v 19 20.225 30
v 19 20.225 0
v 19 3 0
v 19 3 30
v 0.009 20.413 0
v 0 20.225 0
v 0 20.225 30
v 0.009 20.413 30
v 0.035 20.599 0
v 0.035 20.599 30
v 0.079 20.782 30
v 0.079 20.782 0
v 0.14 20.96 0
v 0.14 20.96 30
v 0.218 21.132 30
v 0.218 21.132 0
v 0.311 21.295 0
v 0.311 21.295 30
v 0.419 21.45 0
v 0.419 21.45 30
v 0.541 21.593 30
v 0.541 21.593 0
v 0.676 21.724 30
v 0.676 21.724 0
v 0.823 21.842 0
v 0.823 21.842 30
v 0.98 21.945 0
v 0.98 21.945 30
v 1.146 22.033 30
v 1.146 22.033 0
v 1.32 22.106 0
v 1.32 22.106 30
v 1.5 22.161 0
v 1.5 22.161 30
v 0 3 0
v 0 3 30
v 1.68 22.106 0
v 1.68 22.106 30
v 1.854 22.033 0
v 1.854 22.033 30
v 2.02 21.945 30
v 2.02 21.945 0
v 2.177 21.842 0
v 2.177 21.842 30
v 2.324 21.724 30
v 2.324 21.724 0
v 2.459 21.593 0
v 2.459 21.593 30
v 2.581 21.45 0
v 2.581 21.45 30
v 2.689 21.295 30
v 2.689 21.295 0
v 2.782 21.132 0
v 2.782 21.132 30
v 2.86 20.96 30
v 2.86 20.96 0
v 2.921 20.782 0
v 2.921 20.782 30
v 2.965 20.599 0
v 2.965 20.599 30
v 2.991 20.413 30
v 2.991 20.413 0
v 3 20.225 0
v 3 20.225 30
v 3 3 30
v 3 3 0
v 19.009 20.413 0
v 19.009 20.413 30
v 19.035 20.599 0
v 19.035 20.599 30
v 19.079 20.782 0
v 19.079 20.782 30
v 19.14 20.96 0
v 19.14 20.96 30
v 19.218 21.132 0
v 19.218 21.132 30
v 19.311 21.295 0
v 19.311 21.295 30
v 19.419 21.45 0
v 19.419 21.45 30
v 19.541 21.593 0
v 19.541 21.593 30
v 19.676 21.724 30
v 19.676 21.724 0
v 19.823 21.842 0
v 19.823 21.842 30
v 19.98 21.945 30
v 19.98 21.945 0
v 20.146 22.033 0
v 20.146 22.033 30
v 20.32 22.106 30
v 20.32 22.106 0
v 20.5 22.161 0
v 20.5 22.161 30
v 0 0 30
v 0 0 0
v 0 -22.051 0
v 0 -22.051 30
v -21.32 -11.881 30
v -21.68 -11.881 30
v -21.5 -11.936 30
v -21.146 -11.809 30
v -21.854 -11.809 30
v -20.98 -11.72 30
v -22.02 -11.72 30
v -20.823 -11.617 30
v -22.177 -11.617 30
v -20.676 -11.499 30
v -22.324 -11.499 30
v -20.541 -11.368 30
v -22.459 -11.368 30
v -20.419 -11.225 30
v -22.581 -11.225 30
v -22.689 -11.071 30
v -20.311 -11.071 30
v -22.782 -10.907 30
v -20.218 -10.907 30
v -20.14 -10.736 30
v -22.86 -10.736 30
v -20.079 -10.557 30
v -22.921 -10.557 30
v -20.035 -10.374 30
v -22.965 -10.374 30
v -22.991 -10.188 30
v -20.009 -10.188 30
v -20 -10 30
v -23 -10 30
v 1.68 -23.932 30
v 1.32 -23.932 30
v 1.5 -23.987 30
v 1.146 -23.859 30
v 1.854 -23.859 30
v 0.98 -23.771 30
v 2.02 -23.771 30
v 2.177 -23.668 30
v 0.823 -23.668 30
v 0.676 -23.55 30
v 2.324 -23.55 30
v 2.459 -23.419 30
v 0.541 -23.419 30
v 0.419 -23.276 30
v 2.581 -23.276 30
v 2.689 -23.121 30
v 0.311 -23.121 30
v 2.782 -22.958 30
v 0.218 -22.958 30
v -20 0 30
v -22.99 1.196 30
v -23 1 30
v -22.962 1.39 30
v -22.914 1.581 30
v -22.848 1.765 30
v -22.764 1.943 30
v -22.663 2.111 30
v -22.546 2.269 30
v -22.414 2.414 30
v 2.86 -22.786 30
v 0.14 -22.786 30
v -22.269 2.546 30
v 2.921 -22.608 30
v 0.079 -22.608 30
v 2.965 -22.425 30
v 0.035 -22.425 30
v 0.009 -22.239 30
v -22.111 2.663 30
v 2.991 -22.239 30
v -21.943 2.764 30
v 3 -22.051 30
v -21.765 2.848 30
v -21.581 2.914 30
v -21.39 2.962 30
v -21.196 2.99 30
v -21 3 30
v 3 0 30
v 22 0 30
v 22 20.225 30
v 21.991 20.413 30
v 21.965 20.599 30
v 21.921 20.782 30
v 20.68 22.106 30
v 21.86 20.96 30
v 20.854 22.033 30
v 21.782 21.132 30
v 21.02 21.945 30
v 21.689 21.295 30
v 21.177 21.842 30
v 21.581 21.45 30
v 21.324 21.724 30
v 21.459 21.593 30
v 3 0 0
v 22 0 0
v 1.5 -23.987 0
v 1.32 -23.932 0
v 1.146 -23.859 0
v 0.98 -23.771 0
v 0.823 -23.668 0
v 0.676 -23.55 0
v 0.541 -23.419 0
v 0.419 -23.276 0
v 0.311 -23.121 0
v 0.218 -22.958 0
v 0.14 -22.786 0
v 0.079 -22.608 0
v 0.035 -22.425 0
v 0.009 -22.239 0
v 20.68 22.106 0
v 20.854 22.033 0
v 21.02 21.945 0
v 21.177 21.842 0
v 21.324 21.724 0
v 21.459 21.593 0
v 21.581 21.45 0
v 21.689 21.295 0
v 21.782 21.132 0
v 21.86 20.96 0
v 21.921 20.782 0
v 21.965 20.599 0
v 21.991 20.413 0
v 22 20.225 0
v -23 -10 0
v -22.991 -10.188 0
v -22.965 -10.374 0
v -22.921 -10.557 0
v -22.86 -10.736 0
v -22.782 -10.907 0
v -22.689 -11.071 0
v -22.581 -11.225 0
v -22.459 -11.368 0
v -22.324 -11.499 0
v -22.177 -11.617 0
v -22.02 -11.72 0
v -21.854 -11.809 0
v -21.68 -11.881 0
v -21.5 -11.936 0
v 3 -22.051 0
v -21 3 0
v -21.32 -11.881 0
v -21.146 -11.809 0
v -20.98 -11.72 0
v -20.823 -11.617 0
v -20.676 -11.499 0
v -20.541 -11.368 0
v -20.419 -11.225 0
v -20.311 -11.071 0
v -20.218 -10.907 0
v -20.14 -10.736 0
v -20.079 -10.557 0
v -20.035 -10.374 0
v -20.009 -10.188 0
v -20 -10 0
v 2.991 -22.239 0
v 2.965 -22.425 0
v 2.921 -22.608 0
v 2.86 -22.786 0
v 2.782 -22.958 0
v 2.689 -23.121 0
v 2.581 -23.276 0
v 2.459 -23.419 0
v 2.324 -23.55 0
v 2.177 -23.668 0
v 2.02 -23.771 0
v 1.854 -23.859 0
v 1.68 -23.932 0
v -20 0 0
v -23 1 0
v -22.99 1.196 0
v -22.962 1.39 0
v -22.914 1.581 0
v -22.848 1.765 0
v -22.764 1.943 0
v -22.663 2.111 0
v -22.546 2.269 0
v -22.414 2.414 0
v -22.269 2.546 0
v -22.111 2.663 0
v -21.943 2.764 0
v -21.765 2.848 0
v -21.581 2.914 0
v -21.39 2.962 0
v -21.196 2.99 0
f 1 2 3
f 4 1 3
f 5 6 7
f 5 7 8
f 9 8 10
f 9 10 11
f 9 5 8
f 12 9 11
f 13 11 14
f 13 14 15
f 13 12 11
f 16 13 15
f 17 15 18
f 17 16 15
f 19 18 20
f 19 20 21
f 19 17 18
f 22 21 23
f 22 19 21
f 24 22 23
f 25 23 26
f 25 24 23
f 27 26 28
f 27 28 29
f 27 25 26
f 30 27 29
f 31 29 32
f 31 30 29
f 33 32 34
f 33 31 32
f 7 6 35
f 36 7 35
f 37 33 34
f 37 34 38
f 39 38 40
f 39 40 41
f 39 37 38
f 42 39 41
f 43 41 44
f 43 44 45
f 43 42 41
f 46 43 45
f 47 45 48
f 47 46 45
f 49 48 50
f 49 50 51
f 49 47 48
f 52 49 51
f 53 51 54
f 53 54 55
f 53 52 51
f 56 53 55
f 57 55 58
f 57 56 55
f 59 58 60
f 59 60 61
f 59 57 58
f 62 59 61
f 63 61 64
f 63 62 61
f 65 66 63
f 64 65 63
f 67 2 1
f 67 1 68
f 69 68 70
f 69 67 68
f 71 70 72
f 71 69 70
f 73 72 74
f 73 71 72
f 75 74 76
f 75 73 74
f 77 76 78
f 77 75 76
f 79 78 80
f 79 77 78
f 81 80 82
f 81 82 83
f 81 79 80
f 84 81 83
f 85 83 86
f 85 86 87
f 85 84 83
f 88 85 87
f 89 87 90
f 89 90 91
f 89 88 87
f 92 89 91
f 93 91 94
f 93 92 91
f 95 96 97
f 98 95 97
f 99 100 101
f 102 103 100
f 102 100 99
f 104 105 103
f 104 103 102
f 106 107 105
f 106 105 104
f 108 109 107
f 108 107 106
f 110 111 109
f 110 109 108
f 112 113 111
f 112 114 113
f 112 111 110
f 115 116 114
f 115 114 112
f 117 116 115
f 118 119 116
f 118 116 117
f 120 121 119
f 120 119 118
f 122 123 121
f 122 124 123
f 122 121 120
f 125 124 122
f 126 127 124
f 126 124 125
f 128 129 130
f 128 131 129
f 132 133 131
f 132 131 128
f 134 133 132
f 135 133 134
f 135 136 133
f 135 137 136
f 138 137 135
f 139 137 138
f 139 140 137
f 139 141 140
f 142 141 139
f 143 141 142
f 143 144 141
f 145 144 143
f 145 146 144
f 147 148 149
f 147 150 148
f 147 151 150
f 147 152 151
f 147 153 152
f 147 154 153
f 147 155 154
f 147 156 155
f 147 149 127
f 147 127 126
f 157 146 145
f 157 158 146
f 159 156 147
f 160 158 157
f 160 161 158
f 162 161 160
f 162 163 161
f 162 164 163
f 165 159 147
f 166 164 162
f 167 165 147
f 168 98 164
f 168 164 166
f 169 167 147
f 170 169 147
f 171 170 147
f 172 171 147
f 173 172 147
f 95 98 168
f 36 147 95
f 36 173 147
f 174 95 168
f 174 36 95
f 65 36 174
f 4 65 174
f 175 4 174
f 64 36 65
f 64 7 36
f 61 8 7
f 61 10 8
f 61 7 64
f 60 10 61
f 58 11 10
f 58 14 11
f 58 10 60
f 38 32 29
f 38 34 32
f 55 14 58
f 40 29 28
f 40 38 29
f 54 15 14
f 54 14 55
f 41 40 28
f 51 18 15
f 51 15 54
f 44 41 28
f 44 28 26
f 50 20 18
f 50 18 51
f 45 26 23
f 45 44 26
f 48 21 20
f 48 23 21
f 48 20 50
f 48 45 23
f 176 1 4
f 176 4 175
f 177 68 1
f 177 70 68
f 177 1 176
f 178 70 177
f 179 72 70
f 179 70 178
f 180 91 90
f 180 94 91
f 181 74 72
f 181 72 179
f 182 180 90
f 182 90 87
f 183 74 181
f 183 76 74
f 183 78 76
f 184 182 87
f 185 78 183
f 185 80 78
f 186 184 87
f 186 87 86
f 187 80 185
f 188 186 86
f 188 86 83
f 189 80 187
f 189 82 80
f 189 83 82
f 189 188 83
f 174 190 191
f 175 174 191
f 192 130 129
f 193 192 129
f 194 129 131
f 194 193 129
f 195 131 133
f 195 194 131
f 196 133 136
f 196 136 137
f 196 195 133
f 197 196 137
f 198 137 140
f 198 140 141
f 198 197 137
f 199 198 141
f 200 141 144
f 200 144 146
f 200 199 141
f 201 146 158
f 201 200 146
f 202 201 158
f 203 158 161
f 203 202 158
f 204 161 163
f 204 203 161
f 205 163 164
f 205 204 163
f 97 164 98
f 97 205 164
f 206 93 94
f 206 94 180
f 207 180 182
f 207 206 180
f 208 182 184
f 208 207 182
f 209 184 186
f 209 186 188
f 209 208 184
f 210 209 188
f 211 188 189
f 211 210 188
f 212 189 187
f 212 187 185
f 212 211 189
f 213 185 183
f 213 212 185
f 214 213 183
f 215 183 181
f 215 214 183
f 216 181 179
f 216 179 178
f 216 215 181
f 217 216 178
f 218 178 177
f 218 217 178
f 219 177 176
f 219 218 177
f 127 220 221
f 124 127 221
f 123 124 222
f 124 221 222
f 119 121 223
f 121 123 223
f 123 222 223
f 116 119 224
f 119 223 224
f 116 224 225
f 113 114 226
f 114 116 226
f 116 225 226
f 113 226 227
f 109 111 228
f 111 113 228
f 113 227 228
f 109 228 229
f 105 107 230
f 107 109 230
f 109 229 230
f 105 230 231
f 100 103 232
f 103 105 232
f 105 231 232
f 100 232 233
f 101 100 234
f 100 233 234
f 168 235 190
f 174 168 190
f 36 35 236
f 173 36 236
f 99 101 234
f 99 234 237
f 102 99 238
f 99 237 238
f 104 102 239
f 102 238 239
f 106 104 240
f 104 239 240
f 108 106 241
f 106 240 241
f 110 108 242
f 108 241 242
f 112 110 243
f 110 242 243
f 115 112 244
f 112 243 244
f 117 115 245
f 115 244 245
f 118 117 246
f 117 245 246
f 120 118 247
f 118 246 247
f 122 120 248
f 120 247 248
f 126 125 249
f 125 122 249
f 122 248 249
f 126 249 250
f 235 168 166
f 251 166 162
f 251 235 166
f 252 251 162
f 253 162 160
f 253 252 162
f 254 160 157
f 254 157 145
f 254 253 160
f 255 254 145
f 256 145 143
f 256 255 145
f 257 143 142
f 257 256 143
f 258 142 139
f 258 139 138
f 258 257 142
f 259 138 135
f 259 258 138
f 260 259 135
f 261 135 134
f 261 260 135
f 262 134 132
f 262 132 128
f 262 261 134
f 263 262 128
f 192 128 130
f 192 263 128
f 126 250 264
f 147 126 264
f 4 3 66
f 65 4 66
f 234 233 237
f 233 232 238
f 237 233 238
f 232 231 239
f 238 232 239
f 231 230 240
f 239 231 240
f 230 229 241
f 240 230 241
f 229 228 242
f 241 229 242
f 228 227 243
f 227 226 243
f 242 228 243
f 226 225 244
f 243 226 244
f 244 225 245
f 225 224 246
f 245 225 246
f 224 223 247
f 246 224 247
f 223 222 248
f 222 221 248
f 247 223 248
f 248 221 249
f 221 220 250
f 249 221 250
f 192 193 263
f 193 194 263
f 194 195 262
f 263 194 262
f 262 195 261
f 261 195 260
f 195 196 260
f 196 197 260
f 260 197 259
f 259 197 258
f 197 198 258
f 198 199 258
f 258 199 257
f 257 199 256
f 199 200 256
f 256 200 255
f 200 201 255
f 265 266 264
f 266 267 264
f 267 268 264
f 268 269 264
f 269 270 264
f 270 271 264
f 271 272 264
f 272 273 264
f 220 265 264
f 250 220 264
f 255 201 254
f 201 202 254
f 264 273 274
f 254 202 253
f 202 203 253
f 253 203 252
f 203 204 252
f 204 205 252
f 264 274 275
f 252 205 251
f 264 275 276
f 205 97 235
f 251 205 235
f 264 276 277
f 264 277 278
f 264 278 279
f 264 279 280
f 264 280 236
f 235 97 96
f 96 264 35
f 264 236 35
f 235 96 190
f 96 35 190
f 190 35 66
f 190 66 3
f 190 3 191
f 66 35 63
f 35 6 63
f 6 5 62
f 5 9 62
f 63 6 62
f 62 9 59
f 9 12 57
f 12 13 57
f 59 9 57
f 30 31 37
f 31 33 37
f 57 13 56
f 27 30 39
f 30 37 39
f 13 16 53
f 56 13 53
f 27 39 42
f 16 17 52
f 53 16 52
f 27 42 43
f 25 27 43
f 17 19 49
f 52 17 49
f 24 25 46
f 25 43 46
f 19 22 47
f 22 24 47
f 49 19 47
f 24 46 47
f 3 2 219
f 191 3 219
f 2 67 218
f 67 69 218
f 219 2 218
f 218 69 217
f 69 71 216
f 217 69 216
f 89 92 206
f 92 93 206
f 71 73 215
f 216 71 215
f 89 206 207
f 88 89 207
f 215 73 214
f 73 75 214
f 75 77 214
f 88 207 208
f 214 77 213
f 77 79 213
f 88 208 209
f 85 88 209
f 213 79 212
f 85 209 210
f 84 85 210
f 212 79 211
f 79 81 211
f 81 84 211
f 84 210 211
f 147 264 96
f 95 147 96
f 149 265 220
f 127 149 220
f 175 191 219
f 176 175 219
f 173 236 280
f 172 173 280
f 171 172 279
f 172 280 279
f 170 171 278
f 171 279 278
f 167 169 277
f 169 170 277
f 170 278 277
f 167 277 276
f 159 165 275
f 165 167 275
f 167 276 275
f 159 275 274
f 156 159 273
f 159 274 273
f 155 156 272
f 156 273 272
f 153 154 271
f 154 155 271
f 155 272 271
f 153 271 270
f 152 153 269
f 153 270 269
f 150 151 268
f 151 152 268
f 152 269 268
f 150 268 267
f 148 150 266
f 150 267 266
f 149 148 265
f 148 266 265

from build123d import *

# Parameters (mm, degrees)
F1_DEPTH    = 30
F2_T1_DEPTH = 40
F3_T1_DEPTH = 40
F4_T1_DEPTH = 40


# Not quite as in the source:
# - a fillet or chamfer that OpenCascade refuses, or shapes differently, is made with other operations: its cross-section is extruded or revolved along the edge and cut away or added


with BuildPart() as f1:
    # F0 (on Top) → F1 (new body)
    with BuildSketch(Plane.XY):
        Polygon((-20, 3), (-23, 3), (-23, -12), (-20, -12), (-20, 0), (0, 0), (0, -12), (0, -24.0508113056), (3, -24.0508113056), (3, -12), (3, 0), (19, 0), (22, 0), (22, 22.2248057965), (19, 22.2248057965), (19, 3), (3, 3), (3, 22.2248057965), (0, 22.2248057965), (0, 3), align=None)
    extrude(amount=F1_DEPTH)

    # F2: fillet of radius 2 on 2 edges, made by hand

    # F2_s2 → F2_t1 (cut)
    with BuildSketch(Plane.XY.offset(-5)):
        with BuildLine():
            ThreePointArc((2, -24.0508113056), (0.5857864376, -23.465024868), (0, -22.0508113056))
            Line((0, -22.0508113056), (0, -24.0508113056))
            Line((0, -24.0508113056), (2, -24.0508113056))
        make_face()
        with BuildLine():
            ThreePointArc((3, -22.0508113056), (2.4142135624, -23.465024868), (1, -24.0508113056))
            Line((1, -24.0508113056), (3, -24.0508113056))
            Line((3, -24.0508113056), (3, -22.0508113056))
        make_face()
    extrude(amount=F2_T1_DEPTH, mode=Mode.SUBTRACT)

    # F3: fillet of radius 2 on 2 edges, made by hand

    # F3_s2 → F3_t1 (cut)
    with BuildSketch(Plane.XY.offset(-5)):
        with BuildLine():
            ThreePointArc((-23, -10), (-22.4142135624, -11.4142135624), (-21, -12))
            Line((-21, -12), (-23, -12))
            Line((-23, -12), (-23, -10))
        make_face()
        with BuildLine():
            ThreePointArc((-22, -12), (-20.5857864376, -11.4142135624), (-20, -10))
            Line((-20, -10), (-20, -12))
            Line((-20, -12), (-22, -12))
        make_face()
    extrude(amount=F3_T1_DEPTH, mode=Mode.SUBTRACT)

    # F4: fillet of radius 2 on 5 edges, made by hand

    # F4_s2 → F4_t1 (cut)
    with BuildSketch(Plane.XY.offset(-5)):
        with BuildLine():
            ThreePointArc((-21, 3), (-22.4142135624, 2.4142135624), (-23, 1))
            Line((-23, 1), (-23, 3))
            Line((-23, 3), (-21, 3))
        make_face()
        with BuildLine():
            ThreePointArc((0, 20.2248057965), (0.5857864376, 21.6390193588), (2, 22.2248057965))
            Line((2, 22.2248057965), (0, 22.2248057965))
            Line((0, 22.2248057965), (0, 20.2248057965))
        make_face()
        with BuildLine():
            ThreePointArc((19, 20.2248057965), (19.5857864376, 21.6390193588), (21, 22.2248057965))
            Line((21, 22.2248057965), (19, 22.2248057965))
            Line((19, 22.2248057965), (19, 20.2248057965))
        make_face()
        with BuildLine():
            ThreePointArc((1, 22.2248057965), (2.4142135624, 21.6390193588), (3, 20.2248057965))
            Line((3, 20.2248057965), (3, 22.2248057965))
            Line((3, 22.2248057965), (1, 22.2248057965))
        make_face()
        with BuildLine():
            ThreePointArc((20, 22.2248057965), (21.4142135624, 21.6390193588), (22, 20.2248057965))
            Line((22, 20.2248057965), (22, 22.2248057965))
            Line((22, 22.2248057965), (20, 22.2248057965))
        make_face()
    extrude(amount=F4_T1_DEPTH, mode=Mode.SUBTRACT)


solid = f1.part
